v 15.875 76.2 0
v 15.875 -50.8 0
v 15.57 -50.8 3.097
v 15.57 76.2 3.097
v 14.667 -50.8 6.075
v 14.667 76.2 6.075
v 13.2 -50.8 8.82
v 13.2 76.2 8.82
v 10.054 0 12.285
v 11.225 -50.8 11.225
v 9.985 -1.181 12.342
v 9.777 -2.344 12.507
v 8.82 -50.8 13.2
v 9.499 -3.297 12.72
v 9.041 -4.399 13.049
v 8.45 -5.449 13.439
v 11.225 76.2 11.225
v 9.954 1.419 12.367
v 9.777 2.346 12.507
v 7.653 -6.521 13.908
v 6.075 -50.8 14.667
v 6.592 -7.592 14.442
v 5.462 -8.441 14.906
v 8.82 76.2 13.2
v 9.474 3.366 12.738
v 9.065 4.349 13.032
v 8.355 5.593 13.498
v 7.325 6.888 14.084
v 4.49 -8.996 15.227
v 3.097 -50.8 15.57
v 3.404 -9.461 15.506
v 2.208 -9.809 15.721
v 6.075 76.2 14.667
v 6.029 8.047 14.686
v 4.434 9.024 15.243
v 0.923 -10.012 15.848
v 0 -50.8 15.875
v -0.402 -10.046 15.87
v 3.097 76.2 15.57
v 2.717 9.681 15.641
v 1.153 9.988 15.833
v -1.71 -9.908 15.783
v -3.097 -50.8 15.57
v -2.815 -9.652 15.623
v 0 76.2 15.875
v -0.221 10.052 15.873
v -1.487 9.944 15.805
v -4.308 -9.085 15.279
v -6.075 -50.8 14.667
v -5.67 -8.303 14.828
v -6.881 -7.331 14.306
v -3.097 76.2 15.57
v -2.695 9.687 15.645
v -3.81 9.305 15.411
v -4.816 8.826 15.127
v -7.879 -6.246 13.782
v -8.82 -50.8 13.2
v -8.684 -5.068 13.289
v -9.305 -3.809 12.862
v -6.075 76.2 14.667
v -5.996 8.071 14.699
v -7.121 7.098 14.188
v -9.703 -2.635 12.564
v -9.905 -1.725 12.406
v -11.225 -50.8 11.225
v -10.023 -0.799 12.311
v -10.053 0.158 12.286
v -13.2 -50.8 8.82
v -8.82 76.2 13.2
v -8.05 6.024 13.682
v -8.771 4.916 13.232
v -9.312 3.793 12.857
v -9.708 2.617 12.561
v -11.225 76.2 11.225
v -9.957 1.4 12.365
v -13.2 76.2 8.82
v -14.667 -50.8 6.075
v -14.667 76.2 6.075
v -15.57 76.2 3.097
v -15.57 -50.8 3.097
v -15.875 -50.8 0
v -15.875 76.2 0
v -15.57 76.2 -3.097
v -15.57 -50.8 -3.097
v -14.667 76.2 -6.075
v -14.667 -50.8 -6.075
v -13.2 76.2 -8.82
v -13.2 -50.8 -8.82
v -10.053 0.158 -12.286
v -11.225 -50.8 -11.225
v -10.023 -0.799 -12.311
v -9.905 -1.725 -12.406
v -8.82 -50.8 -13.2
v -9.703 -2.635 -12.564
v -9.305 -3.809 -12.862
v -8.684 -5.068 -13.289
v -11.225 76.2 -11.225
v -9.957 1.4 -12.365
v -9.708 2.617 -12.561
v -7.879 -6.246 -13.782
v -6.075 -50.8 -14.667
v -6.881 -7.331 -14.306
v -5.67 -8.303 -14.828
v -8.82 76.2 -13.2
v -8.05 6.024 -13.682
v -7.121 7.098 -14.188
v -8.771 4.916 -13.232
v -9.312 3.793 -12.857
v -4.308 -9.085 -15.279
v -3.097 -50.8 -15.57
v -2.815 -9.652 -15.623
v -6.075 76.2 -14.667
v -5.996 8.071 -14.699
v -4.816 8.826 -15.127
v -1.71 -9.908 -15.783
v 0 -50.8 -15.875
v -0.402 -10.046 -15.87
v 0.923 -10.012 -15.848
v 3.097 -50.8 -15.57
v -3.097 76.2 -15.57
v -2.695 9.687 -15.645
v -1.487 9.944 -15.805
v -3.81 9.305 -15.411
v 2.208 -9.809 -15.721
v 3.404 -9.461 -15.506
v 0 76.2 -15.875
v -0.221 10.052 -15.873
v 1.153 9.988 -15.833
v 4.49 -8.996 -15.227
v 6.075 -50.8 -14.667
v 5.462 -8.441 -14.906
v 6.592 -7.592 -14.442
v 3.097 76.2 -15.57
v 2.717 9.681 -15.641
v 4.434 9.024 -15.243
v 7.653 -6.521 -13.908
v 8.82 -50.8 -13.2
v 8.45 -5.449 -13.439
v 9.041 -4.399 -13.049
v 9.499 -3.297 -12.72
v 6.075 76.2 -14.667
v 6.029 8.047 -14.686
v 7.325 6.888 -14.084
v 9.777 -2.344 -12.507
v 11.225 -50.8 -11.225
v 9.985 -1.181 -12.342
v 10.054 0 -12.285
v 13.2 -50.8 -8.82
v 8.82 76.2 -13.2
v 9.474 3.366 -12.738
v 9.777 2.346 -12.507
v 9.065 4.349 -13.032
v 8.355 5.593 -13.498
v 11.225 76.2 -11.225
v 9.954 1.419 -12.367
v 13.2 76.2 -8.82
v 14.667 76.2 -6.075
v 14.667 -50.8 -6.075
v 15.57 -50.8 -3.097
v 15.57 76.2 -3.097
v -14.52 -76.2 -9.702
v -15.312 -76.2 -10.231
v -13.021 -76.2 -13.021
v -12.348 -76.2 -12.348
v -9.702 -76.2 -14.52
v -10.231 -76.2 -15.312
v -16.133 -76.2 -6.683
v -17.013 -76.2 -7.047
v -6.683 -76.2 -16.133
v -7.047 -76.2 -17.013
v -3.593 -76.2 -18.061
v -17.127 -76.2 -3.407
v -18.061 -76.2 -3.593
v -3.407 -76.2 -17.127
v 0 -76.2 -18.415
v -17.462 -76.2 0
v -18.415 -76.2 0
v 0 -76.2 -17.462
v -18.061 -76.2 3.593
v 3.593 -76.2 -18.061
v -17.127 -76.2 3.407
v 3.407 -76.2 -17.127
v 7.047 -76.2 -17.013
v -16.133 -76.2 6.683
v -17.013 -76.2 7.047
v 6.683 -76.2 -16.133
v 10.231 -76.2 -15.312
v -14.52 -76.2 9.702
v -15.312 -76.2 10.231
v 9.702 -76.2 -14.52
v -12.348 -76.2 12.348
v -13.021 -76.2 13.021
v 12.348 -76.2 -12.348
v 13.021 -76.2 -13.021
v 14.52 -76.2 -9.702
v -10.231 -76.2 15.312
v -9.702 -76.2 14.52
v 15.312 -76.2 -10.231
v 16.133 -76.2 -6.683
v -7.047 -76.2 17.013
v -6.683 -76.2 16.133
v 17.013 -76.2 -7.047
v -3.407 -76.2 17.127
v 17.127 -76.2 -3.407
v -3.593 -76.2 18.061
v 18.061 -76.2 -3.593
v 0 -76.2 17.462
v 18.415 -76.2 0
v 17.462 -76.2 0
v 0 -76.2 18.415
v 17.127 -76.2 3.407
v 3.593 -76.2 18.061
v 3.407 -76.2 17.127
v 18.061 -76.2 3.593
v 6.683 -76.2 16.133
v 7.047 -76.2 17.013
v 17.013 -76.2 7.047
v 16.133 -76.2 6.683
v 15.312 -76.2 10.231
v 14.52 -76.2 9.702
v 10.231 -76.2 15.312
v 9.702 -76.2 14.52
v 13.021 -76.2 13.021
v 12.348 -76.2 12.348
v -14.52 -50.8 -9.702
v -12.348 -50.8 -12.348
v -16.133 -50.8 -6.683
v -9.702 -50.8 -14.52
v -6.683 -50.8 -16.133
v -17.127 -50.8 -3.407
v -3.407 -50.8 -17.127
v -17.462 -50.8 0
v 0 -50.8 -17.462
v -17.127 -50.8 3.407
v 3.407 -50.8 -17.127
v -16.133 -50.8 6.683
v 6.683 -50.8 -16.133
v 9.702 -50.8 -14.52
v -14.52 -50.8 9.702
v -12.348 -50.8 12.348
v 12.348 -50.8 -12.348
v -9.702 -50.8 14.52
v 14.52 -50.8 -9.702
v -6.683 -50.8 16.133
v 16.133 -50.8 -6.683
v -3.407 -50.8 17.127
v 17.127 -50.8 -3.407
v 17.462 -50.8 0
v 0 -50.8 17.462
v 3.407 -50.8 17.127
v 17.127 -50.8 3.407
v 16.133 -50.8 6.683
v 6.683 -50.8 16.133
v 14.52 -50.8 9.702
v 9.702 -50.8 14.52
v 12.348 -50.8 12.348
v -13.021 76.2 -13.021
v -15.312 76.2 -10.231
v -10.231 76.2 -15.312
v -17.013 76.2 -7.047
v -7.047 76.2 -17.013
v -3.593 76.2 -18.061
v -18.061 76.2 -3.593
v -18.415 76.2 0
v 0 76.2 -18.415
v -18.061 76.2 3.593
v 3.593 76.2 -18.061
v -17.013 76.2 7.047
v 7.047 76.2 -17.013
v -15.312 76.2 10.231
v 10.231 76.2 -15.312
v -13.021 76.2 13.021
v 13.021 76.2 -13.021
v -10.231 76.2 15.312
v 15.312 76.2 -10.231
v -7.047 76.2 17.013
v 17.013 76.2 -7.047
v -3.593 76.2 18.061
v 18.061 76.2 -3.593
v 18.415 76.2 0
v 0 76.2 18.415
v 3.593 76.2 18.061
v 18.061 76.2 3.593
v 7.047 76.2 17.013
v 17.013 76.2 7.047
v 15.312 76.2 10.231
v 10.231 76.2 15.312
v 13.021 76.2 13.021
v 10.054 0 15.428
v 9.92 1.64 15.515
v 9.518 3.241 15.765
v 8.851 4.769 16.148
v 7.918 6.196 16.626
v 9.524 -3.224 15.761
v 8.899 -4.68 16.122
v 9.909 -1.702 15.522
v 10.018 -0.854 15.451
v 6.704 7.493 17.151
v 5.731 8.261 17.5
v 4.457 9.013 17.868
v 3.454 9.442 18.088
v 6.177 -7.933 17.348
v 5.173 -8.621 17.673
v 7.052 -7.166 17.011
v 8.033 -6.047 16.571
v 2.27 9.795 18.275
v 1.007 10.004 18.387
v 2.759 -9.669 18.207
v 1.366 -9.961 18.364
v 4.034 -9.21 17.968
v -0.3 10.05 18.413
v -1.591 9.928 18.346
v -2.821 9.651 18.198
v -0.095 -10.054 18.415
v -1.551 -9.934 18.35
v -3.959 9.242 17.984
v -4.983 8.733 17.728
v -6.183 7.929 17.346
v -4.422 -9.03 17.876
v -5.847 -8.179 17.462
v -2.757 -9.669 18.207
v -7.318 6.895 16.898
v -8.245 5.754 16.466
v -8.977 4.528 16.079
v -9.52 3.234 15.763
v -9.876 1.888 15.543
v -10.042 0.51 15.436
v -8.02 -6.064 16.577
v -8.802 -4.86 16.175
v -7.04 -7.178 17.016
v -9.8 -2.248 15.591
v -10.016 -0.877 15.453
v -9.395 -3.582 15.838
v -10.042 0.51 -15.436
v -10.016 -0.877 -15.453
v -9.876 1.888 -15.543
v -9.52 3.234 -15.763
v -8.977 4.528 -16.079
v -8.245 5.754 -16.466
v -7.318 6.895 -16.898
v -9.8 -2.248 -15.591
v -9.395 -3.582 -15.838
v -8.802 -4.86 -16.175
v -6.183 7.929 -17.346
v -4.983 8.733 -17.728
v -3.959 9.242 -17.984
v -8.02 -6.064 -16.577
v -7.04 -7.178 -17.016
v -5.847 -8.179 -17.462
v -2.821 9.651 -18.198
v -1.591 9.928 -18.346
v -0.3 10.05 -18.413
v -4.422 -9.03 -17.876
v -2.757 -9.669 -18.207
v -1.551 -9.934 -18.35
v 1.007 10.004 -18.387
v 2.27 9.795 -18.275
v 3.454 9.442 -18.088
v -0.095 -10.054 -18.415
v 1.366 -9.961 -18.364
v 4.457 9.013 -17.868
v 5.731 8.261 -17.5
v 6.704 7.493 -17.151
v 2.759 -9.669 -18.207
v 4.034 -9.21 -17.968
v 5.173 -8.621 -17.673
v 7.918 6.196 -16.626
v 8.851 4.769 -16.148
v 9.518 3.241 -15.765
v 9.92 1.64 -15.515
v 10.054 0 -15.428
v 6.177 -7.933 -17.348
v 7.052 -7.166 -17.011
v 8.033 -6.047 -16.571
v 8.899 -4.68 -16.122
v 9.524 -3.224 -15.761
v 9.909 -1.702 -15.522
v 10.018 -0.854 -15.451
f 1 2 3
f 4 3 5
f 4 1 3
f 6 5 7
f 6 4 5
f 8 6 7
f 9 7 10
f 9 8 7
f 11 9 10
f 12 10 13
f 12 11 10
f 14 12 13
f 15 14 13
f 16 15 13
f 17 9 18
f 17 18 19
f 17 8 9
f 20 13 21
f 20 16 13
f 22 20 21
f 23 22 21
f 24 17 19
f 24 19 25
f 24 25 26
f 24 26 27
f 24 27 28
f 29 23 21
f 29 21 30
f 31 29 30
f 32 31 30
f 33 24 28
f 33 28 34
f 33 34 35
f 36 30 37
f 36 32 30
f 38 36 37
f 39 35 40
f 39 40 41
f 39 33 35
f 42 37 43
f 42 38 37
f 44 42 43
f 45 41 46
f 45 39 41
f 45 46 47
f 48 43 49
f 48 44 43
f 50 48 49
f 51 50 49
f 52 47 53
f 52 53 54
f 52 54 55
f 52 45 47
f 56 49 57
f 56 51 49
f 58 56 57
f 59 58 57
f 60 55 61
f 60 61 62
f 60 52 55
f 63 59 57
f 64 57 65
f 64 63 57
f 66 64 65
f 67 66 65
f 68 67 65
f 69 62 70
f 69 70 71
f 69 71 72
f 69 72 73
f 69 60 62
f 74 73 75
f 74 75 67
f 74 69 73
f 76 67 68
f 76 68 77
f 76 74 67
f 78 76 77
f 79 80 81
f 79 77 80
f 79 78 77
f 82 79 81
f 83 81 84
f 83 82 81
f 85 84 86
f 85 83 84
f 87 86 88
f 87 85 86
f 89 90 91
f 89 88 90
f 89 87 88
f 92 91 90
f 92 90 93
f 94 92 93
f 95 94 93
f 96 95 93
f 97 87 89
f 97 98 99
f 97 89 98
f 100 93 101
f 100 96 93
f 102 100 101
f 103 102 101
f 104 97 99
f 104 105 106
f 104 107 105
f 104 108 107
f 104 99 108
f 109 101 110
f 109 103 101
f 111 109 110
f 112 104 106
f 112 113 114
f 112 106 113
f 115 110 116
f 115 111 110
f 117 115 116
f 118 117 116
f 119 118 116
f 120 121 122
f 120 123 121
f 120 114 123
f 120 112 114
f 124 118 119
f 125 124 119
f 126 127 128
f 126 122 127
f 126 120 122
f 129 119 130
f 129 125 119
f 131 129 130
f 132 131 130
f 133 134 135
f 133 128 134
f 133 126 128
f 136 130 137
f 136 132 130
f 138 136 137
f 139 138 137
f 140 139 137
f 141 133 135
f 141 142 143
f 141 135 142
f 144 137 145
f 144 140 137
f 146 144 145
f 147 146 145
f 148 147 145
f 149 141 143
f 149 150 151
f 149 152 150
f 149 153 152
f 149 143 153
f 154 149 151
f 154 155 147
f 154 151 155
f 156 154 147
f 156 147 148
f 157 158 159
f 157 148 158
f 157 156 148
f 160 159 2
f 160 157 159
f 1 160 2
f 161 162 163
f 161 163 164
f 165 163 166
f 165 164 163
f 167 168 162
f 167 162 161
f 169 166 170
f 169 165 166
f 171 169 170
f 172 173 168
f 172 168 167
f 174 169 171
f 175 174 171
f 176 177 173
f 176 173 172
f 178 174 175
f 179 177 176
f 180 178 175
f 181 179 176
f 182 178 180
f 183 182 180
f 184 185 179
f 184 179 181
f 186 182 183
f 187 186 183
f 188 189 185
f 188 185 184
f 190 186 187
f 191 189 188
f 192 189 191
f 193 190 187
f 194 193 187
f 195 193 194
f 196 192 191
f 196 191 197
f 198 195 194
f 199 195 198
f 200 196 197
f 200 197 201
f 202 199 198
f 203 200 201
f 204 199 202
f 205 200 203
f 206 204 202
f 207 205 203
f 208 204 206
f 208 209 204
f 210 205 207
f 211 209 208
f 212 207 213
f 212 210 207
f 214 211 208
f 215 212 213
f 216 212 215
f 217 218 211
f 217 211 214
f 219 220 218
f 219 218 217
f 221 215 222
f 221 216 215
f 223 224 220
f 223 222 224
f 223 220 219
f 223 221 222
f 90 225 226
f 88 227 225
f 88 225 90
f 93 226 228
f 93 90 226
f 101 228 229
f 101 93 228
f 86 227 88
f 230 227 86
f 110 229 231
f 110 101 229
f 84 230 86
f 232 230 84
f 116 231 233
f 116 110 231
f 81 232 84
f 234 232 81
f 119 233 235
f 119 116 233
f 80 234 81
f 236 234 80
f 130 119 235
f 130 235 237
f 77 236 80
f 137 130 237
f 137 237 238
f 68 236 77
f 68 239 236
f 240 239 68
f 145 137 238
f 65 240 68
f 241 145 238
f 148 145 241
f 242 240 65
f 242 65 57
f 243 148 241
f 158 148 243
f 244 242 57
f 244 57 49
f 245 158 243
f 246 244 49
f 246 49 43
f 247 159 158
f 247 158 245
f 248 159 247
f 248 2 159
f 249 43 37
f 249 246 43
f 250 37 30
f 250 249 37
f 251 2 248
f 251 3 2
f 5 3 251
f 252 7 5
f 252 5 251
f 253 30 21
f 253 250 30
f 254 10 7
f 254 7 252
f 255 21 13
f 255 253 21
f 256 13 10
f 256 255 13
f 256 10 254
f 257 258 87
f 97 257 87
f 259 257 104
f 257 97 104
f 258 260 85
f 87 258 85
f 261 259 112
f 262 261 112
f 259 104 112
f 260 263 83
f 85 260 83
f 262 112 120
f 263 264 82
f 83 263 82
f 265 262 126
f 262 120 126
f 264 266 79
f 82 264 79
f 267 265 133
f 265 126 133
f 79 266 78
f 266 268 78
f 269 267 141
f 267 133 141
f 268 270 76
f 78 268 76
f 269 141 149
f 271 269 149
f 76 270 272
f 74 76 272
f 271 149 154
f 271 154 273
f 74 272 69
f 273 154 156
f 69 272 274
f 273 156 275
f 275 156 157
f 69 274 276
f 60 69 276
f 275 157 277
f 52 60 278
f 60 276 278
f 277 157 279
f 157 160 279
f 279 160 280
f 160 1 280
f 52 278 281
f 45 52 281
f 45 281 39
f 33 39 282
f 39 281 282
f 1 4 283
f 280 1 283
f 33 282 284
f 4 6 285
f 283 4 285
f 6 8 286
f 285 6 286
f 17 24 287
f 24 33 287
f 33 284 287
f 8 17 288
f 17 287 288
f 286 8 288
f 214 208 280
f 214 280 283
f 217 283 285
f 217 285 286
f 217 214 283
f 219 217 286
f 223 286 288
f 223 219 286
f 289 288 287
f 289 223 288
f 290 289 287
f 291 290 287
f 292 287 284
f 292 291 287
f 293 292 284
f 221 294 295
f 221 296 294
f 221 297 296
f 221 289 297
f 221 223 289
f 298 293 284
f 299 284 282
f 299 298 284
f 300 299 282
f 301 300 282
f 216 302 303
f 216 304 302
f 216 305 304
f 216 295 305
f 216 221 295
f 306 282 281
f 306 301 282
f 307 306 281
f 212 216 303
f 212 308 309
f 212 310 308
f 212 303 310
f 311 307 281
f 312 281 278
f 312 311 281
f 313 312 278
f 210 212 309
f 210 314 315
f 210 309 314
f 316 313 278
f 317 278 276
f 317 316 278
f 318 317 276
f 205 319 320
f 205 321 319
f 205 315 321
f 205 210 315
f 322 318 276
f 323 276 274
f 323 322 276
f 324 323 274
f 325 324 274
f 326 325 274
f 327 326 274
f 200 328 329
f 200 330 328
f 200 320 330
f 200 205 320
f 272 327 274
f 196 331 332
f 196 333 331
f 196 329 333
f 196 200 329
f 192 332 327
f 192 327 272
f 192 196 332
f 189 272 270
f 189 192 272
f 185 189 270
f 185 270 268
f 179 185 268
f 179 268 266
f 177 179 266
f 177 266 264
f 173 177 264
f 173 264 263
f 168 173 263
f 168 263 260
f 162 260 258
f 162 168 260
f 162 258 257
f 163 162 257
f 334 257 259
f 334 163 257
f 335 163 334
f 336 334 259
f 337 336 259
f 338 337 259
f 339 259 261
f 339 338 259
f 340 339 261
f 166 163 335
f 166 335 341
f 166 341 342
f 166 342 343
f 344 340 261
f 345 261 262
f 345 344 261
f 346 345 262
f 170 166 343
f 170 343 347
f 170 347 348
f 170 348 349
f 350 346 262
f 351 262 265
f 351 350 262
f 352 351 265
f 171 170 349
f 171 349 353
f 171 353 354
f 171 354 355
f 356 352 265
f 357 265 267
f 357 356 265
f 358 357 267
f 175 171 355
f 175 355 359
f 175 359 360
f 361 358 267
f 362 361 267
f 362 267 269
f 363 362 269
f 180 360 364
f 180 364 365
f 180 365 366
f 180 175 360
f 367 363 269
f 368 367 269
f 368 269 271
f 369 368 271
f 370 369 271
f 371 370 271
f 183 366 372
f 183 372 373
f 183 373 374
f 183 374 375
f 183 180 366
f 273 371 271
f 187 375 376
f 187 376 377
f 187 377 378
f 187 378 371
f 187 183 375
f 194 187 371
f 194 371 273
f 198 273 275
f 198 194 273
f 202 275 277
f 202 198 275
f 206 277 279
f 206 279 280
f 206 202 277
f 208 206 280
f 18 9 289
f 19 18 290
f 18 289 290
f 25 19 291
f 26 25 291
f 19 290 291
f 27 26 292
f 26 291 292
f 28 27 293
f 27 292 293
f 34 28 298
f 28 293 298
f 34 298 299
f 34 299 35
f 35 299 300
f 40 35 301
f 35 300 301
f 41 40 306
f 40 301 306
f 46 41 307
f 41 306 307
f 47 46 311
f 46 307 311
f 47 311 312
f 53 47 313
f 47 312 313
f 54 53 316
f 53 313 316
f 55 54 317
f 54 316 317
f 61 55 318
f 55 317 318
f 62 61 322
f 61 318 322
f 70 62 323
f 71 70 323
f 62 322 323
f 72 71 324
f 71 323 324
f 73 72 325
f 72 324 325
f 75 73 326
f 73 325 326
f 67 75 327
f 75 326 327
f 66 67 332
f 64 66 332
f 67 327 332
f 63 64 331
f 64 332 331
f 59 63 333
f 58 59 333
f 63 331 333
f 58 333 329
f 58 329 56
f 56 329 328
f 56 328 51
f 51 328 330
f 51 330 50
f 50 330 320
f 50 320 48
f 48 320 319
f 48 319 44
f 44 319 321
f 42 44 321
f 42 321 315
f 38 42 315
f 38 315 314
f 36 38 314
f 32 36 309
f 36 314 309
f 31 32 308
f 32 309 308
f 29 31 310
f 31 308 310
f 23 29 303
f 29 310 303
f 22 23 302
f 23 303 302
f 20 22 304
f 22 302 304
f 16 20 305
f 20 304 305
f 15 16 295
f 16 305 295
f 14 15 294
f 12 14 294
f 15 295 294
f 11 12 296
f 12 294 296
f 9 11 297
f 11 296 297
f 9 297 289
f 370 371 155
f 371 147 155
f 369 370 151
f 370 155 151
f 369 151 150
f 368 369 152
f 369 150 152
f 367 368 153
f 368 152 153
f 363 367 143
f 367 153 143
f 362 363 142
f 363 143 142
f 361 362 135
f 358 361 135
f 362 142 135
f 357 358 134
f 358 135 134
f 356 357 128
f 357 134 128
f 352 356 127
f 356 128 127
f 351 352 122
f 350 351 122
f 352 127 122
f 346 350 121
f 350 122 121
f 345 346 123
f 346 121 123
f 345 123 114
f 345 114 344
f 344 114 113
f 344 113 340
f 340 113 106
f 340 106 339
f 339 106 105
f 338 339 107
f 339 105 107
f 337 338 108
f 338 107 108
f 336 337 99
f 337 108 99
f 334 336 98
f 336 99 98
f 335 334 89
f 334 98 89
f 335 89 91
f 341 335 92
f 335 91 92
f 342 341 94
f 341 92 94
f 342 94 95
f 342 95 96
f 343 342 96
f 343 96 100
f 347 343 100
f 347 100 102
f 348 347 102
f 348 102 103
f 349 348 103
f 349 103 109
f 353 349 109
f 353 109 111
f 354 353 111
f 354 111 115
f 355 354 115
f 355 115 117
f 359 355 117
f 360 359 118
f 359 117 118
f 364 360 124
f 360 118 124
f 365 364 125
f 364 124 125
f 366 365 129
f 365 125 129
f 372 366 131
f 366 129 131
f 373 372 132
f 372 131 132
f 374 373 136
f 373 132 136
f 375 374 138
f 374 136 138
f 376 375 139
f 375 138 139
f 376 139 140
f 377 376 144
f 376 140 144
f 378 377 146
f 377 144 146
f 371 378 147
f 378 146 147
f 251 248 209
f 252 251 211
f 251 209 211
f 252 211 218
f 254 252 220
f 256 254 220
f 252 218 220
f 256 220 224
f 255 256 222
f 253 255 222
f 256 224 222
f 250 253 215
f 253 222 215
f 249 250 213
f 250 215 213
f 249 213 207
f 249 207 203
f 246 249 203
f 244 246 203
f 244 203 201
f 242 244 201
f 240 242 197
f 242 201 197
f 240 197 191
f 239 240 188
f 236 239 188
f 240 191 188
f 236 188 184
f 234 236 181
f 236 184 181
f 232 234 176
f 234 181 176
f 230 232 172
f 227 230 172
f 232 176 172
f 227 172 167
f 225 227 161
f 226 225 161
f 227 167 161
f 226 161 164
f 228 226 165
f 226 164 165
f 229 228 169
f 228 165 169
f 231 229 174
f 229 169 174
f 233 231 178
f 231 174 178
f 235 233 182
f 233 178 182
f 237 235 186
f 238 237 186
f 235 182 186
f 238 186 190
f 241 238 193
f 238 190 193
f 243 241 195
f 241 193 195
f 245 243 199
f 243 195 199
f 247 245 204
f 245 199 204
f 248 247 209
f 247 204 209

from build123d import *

# Parameters (mm, degrees)
F0_R     = 18.415
F0_R_2   = 15.875
F1_DEPTH = 76.2
F2_R     = 10.054491
F3_DEPTH = 40.64
F5_R     = 17.4625
F6_DEPTH = 25.4


with BuildPart() as f1:
    # F0 (on Front) → F1 (new body, symmetric)
    with BuildSketch(Plane.XZ):
        Circle(F0_R)
        Circle(F0_R_2, mode=Mode.SUBTRACT)
    extrude(amount=F1_DEPTH, both=True)

    # F2 (on Top) → F3 (cut, symmetric)
    with BuildSketch(Plane.XY):
        Circle(F2_R)
    extrude(amount=F3_DEPTH, both=True, mode=Mode.SUBTRACT)

    # F5 (on face) → F6 (cut)
    with BuildSketch(Plane.XZ.offset(76.2)):
        Circle(F5_R)
    extrude(amount=-F6_DEPTH, mode=Mode.SUBTRACT)


solid = f1.part
